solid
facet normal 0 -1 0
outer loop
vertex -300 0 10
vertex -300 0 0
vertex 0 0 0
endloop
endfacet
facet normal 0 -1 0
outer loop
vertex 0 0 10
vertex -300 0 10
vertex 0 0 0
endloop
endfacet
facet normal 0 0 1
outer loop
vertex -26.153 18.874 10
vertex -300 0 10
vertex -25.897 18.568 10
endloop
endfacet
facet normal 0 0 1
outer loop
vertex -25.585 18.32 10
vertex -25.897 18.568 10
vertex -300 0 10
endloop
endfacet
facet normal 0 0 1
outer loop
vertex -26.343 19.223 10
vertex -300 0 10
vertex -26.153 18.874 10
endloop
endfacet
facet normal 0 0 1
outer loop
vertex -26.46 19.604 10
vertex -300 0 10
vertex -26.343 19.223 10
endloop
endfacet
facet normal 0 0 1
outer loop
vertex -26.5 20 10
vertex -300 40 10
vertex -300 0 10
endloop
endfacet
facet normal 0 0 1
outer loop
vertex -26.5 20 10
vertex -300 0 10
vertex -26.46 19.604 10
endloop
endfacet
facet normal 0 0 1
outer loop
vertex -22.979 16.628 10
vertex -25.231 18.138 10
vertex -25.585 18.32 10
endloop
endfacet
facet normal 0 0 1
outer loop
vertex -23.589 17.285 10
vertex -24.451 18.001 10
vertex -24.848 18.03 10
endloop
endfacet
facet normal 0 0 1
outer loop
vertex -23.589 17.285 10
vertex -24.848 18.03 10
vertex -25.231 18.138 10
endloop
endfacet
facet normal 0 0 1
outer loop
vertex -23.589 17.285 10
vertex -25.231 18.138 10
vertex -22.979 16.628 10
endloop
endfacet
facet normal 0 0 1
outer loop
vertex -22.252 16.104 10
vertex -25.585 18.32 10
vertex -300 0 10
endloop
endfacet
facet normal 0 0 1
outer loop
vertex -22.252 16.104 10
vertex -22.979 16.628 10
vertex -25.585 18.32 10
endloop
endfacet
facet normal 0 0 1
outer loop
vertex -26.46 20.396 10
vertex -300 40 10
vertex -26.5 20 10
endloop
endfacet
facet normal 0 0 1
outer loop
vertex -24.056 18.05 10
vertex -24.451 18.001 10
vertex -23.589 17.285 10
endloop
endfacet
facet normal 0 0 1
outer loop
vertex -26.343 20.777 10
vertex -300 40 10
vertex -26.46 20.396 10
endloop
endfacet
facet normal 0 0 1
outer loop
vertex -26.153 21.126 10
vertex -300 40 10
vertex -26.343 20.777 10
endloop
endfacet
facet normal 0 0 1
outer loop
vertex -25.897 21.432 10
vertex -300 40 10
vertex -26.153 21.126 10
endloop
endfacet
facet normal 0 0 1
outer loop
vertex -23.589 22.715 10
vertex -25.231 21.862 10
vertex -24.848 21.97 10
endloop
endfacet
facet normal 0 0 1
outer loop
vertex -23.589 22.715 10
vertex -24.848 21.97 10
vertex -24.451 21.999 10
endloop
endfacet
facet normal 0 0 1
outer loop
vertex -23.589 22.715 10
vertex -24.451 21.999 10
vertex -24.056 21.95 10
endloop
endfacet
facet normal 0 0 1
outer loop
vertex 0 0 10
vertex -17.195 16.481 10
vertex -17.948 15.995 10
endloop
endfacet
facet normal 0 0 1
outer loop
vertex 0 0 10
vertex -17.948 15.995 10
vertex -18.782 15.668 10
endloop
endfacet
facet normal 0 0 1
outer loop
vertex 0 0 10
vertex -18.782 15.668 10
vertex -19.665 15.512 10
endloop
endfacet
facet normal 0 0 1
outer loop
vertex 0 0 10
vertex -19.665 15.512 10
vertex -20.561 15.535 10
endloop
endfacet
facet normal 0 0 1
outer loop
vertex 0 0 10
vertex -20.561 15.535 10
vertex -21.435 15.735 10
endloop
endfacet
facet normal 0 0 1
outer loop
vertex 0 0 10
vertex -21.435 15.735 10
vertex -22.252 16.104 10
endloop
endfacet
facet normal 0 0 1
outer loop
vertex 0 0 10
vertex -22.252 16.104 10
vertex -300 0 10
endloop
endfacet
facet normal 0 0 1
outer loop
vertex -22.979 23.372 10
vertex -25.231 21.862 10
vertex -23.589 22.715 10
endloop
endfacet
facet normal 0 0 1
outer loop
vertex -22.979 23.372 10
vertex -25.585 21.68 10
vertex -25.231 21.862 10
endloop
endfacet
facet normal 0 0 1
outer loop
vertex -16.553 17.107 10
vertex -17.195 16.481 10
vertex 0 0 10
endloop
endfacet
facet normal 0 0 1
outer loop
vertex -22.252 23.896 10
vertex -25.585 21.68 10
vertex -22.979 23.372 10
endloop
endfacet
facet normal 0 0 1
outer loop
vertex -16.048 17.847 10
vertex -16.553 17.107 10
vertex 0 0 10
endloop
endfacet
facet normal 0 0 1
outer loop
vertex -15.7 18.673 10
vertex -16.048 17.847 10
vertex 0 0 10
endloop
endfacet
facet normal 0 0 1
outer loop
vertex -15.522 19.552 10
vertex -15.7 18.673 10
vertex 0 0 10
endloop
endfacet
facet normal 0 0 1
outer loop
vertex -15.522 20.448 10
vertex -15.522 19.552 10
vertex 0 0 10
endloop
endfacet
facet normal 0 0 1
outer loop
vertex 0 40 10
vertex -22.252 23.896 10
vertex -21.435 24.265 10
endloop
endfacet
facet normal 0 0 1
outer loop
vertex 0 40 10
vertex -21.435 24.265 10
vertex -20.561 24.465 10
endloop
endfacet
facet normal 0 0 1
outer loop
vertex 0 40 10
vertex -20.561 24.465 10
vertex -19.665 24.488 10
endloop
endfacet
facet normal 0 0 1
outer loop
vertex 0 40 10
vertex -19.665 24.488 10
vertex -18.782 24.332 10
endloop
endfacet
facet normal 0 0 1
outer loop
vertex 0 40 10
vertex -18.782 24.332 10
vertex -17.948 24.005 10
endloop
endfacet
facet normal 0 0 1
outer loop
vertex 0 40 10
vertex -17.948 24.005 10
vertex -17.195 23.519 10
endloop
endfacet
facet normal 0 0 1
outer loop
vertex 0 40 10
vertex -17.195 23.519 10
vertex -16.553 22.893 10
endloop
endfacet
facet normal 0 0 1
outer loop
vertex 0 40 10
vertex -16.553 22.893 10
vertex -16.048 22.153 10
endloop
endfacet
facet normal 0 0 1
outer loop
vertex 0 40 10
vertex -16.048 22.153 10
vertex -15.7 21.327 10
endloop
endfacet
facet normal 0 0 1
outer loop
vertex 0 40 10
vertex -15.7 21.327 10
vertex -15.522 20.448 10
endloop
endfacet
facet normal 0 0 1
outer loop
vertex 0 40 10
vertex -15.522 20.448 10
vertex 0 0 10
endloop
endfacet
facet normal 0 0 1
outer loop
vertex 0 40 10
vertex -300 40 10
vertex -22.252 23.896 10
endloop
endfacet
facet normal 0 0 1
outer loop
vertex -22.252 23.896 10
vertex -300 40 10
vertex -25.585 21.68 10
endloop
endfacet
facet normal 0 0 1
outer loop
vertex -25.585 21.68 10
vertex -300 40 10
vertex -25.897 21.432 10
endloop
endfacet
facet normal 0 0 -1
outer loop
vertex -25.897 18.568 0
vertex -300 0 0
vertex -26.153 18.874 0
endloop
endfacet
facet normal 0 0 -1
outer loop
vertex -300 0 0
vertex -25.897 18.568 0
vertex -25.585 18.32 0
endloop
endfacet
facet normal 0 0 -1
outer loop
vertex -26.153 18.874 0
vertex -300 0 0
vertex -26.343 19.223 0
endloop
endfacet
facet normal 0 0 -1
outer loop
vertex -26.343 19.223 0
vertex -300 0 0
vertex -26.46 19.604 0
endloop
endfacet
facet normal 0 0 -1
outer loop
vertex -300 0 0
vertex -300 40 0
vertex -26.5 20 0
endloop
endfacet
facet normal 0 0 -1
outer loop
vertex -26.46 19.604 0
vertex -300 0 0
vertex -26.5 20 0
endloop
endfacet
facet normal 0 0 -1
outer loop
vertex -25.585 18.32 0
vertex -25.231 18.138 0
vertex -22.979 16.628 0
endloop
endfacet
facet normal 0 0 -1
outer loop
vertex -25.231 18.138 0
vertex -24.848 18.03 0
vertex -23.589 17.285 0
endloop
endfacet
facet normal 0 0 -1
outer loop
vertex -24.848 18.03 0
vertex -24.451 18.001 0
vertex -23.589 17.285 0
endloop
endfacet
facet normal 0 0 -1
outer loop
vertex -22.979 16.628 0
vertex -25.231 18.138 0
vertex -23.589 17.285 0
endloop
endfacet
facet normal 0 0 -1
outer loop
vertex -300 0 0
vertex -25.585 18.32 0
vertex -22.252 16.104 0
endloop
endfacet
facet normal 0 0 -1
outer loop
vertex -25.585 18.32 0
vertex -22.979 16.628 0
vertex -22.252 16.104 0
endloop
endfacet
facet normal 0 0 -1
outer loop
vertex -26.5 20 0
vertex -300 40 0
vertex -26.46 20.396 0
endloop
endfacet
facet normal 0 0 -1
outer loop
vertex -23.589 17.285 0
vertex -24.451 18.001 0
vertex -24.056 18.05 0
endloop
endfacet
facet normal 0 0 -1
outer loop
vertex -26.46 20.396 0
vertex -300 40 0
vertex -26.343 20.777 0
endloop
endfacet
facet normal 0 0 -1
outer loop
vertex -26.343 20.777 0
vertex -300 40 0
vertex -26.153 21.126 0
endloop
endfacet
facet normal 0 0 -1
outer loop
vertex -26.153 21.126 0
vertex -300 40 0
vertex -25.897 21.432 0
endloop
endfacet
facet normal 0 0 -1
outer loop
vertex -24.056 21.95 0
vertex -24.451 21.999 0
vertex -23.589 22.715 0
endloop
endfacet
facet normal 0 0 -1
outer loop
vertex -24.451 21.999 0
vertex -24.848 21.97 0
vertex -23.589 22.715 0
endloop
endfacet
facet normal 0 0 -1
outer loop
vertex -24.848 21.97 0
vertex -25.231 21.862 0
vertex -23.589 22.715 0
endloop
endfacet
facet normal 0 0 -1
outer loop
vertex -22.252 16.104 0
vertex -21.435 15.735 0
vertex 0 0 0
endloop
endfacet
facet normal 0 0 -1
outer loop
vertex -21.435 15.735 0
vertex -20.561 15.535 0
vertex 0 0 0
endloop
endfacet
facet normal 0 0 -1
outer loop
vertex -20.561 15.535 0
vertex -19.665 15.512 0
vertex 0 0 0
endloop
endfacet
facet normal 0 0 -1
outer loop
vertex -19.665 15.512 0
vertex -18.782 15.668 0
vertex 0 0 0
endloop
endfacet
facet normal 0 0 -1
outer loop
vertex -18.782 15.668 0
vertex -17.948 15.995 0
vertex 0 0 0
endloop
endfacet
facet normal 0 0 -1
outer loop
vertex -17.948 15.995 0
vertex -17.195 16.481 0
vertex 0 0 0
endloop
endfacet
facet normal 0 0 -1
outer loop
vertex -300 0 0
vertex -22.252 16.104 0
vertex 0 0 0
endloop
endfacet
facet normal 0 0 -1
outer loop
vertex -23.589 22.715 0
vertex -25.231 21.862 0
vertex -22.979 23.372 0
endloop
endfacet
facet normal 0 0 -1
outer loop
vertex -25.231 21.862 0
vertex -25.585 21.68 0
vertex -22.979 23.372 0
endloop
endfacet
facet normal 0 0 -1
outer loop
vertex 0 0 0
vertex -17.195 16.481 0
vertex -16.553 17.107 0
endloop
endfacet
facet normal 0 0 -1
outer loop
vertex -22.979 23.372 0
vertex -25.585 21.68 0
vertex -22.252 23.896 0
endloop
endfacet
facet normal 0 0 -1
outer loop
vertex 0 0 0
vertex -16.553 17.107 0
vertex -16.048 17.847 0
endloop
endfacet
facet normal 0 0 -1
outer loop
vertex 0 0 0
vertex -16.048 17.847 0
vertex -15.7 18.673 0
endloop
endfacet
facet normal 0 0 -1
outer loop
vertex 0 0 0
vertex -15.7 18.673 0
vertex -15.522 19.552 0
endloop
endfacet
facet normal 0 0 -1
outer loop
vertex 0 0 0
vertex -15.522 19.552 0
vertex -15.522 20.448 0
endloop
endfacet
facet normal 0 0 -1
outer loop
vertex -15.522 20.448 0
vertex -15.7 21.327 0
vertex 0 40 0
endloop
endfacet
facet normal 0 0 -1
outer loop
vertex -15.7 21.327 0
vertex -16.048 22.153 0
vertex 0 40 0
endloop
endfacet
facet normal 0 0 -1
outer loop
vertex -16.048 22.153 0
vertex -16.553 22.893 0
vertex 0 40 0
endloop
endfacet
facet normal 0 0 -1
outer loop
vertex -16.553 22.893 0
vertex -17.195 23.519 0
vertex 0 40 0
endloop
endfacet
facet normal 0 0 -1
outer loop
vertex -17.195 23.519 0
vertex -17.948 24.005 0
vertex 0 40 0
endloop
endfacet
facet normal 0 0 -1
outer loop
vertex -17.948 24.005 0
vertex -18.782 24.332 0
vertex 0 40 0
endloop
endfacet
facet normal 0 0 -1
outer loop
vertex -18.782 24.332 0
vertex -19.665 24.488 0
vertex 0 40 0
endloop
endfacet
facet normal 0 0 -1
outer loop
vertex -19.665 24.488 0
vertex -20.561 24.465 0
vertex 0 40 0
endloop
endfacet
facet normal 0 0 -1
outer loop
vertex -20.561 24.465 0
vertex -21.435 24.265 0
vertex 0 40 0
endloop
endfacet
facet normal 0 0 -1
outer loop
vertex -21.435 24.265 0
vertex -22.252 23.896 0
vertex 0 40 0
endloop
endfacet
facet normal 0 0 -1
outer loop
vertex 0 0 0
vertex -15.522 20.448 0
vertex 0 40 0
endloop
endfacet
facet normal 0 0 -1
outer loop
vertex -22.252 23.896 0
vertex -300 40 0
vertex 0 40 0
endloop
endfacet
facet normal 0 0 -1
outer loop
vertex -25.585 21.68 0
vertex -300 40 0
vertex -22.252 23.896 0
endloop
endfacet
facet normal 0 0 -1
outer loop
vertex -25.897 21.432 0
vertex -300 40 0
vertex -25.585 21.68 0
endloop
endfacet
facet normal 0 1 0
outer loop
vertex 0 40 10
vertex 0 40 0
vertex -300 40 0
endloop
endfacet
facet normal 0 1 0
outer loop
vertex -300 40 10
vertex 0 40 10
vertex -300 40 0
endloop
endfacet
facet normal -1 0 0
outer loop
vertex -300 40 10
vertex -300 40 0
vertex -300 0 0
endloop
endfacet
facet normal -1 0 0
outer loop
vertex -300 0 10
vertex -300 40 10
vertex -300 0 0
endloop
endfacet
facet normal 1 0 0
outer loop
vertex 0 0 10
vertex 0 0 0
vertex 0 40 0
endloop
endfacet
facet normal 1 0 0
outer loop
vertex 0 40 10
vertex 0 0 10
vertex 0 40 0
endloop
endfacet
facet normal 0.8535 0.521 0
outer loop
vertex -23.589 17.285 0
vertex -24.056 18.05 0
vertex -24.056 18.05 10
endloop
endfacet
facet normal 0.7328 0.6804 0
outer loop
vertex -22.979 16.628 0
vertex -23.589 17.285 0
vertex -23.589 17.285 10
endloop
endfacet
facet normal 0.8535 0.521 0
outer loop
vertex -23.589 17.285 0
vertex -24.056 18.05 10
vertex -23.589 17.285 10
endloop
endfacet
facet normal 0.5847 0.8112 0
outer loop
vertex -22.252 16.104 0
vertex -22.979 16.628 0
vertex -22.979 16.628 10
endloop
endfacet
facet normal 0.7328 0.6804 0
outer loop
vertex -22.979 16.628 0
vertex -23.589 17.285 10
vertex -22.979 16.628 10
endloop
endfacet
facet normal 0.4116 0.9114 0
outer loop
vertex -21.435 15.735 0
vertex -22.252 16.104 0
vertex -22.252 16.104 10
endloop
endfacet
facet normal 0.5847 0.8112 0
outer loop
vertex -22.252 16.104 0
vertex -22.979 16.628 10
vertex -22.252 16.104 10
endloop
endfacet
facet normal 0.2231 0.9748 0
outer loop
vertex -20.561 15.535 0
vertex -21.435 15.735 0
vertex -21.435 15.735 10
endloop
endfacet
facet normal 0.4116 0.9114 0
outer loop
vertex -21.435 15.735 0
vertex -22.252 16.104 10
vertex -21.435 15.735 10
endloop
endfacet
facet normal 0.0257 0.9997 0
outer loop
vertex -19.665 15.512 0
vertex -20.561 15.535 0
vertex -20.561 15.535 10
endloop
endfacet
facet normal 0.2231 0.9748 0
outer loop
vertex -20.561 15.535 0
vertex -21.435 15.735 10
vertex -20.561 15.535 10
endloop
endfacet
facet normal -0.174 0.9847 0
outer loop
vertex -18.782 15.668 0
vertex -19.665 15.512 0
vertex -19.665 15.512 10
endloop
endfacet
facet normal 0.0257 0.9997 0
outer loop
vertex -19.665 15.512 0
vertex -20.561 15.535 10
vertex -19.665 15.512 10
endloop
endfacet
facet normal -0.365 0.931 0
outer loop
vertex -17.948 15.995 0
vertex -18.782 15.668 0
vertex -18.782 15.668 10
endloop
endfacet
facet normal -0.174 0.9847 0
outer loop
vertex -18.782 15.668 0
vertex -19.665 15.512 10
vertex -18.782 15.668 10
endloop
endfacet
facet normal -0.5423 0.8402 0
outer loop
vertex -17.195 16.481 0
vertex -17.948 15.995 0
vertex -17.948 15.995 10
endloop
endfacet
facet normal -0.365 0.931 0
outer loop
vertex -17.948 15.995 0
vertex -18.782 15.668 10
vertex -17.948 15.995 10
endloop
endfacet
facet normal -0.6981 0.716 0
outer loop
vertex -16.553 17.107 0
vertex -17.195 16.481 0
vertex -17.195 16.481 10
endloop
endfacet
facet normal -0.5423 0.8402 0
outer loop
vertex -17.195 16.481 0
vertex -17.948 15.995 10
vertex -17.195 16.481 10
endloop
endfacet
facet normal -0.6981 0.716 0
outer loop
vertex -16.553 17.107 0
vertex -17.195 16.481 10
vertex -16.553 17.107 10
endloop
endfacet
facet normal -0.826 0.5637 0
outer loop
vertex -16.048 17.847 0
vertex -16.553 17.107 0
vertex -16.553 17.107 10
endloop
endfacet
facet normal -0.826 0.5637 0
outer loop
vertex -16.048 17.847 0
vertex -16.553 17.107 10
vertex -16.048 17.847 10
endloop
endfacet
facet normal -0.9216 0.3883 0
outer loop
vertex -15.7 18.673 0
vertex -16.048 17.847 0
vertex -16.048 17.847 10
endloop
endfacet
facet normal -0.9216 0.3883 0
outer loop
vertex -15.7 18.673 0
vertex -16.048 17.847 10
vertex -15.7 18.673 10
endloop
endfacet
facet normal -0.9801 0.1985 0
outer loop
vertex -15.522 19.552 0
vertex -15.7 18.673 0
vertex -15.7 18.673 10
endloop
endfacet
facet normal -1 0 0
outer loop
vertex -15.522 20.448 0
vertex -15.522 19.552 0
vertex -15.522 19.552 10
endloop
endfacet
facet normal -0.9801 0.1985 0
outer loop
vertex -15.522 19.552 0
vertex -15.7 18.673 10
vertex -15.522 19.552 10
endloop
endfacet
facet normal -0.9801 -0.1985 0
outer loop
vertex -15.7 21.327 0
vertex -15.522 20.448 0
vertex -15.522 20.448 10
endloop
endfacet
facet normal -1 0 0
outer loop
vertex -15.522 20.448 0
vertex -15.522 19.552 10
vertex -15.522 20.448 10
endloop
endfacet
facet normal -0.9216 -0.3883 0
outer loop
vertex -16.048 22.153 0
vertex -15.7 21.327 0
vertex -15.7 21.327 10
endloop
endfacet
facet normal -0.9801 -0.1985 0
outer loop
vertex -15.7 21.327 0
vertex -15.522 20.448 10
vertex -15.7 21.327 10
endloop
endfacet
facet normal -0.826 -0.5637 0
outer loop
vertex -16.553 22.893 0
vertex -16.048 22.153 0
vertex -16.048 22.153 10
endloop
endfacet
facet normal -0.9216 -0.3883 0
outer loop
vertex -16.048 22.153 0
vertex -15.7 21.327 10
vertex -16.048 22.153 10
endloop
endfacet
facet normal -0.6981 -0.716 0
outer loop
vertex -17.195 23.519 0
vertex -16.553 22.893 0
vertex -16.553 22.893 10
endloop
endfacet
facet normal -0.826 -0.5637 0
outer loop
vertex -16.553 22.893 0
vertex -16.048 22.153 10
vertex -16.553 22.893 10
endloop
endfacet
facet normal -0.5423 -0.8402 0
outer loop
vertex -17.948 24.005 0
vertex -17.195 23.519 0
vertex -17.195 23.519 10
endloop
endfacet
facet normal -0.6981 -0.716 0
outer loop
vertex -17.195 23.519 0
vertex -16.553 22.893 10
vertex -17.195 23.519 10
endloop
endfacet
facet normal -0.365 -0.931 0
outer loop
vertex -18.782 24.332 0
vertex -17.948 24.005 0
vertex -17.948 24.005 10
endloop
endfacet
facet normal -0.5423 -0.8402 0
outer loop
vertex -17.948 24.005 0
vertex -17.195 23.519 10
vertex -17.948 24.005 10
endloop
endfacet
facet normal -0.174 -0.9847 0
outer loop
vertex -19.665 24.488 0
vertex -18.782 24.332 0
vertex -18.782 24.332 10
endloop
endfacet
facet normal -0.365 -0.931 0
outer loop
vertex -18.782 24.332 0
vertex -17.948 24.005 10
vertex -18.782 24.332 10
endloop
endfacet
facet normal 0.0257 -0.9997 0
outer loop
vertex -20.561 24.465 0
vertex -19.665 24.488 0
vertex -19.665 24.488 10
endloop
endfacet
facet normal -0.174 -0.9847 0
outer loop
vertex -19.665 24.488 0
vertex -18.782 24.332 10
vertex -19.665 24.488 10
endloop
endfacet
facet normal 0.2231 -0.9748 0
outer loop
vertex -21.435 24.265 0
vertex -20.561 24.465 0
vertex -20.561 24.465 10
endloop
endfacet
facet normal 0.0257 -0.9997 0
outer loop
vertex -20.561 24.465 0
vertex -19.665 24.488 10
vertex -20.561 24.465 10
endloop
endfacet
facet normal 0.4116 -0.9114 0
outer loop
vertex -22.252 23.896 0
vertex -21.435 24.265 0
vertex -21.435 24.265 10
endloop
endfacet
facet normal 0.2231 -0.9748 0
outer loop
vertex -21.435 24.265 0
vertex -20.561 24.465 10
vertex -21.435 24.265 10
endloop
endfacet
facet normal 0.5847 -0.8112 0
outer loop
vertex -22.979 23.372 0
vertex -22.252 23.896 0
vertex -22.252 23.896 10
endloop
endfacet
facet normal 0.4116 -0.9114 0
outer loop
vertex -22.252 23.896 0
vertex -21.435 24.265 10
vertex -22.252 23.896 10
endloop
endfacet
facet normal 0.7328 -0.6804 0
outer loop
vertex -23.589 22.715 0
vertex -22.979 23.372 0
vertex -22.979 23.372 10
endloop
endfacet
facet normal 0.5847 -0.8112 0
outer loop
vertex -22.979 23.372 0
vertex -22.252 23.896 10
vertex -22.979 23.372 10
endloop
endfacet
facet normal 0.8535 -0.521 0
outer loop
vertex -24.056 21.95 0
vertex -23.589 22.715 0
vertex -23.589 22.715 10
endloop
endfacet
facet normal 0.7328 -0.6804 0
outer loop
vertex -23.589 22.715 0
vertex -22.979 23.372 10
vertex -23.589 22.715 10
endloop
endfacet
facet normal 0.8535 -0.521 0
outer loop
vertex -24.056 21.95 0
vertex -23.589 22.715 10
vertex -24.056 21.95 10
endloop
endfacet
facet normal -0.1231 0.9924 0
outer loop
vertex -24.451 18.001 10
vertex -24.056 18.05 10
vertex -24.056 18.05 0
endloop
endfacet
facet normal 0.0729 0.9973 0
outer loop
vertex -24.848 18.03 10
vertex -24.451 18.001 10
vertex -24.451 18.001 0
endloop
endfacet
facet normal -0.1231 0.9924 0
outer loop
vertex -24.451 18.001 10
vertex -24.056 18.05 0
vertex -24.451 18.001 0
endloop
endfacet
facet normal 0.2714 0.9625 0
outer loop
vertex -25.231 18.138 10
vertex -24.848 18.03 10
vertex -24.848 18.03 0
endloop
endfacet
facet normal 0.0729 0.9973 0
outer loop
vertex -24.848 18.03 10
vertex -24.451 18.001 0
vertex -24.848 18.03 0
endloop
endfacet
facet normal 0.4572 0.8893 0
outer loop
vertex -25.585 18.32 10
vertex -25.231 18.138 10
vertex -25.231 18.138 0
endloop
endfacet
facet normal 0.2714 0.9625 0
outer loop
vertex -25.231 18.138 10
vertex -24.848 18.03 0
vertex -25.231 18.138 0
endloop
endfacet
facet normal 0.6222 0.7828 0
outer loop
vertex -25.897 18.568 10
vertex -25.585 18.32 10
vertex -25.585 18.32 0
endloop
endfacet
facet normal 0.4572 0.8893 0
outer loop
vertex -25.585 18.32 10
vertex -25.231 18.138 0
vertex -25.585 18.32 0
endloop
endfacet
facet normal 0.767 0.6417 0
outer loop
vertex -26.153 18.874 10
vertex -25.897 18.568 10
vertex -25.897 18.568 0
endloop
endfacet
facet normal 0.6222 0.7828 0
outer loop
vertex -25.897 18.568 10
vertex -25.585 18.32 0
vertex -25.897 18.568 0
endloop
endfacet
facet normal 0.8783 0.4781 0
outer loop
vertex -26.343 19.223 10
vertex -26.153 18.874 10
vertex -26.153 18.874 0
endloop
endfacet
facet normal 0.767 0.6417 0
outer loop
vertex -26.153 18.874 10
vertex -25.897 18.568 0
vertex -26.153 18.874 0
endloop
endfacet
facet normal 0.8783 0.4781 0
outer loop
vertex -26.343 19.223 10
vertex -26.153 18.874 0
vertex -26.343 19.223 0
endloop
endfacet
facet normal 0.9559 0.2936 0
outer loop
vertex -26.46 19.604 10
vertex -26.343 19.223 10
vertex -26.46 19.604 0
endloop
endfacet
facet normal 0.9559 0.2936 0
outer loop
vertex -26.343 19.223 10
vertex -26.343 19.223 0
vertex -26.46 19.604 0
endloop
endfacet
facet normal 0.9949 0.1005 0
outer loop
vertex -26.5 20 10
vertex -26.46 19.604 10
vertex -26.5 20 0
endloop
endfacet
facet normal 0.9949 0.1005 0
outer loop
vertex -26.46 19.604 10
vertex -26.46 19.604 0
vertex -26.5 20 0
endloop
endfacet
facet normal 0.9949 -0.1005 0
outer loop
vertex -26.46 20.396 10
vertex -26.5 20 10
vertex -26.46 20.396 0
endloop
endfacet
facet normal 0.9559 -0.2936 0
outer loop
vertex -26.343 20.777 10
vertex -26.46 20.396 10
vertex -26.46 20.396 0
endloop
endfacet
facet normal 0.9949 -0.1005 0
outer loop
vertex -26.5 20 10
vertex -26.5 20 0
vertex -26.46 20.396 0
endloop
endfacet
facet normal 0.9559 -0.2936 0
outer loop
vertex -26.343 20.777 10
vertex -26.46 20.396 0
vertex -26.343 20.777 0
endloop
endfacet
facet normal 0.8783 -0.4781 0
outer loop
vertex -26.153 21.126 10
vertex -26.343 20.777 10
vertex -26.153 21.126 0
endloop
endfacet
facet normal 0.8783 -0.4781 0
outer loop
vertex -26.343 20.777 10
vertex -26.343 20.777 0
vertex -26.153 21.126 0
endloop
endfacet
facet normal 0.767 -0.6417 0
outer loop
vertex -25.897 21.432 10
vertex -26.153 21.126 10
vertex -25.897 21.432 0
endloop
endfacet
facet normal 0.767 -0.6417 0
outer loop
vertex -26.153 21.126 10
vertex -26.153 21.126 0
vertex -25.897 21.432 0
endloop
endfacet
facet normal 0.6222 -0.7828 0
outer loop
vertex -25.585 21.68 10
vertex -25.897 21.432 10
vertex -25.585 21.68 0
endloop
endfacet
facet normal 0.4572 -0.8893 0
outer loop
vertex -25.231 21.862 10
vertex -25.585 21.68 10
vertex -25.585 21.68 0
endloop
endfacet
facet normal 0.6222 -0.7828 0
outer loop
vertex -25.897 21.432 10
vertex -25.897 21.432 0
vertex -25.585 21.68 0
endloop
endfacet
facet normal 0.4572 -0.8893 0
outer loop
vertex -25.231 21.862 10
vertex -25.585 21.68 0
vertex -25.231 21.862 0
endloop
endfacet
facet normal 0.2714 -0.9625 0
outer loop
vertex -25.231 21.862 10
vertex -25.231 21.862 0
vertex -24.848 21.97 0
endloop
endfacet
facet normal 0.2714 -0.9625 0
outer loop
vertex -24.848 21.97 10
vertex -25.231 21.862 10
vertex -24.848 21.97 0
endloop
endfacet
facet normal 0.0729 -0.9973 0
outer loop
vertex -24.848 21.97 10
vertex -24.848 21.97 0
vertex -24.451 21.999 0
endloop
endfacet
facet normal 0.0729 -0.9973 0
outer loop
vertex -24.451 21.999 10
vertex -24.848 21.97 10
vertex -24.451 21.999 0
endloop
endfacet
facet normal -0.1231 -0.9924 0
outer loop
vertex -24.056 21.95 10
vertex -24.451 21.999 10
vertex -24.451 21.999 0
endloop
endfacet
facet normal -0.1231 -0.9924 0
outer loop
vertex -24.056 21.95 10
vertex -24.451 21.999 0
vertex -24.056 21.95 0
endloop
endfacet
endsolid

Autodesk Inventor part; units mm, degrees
ref_plane "YZ Plane" through (0, 0, 0) normal (1, 0, 0) x (0, 1, 0)
ref_plane "XZ Plane" through (0, 0, 0) normal (0, 1, 0) x (-1, 0, 0)
ref_plane "XY Plane" through (0, 0, 0) normal (0, 0, 1) x (1, 0, 0)
sketch "Skizze1" plane through (0, 0, 0) normal (0, 0, 1) x (1, 0, 0)
  line L0 (0, 40) -> (-300, 40)
  line L1 (-300, 40) -> (-300, 0)
  line L2 (-300, 0) -> (0, 0)
  line L3 (0, 0) -> (0, 40)
  line L4 (-360, 0) -> (60, 0) projected
  line L5 (0, -8) -> (0, 48) projected
  dimension "d0" = 300
  dimension "d1" = 40
extrude "Extrusion1" add sketch "Skizze1" along normal blind 10
sketch "Skizze2" plane through (0, 0, 0) normal (0, 0, -1) x (-1, 0, 0)
  line L0 (0, 40) -> (300, 40) projected
  line L1 (0, 0) -> (0, 40) projected
  point P0 (20, 20)
  dimension "d4" = 20
  dimension "d5" = 20
hole "Bohrung1" at (-20, 20, 0) direction (0, 0, 1) diameter 9 end through all
sketch "Skizze3" plane through (0, 0, 0) normal (0, 0, -1) x (-1, 0, 0)
  circle A0 centre (20, 20) radius 4.5 projected
  line L0 (0, 40) -> (300, 40) projected
  line L1 (20, 20) -> (24.5, 20)
  circle A1 centre (24.5, 20) radius 2
  point P0 (24.0556, 18.05)
  point P1 (24.0556, 21.95)
  dimension "d13" = 4
extrude "Extrusion2" cut sketch "Skizze3" against normal blind 10 contours A0 A1 picked at (25.084, 19.4875)
properties part number "Hebel_camera" material "Holz (Eiche)"
